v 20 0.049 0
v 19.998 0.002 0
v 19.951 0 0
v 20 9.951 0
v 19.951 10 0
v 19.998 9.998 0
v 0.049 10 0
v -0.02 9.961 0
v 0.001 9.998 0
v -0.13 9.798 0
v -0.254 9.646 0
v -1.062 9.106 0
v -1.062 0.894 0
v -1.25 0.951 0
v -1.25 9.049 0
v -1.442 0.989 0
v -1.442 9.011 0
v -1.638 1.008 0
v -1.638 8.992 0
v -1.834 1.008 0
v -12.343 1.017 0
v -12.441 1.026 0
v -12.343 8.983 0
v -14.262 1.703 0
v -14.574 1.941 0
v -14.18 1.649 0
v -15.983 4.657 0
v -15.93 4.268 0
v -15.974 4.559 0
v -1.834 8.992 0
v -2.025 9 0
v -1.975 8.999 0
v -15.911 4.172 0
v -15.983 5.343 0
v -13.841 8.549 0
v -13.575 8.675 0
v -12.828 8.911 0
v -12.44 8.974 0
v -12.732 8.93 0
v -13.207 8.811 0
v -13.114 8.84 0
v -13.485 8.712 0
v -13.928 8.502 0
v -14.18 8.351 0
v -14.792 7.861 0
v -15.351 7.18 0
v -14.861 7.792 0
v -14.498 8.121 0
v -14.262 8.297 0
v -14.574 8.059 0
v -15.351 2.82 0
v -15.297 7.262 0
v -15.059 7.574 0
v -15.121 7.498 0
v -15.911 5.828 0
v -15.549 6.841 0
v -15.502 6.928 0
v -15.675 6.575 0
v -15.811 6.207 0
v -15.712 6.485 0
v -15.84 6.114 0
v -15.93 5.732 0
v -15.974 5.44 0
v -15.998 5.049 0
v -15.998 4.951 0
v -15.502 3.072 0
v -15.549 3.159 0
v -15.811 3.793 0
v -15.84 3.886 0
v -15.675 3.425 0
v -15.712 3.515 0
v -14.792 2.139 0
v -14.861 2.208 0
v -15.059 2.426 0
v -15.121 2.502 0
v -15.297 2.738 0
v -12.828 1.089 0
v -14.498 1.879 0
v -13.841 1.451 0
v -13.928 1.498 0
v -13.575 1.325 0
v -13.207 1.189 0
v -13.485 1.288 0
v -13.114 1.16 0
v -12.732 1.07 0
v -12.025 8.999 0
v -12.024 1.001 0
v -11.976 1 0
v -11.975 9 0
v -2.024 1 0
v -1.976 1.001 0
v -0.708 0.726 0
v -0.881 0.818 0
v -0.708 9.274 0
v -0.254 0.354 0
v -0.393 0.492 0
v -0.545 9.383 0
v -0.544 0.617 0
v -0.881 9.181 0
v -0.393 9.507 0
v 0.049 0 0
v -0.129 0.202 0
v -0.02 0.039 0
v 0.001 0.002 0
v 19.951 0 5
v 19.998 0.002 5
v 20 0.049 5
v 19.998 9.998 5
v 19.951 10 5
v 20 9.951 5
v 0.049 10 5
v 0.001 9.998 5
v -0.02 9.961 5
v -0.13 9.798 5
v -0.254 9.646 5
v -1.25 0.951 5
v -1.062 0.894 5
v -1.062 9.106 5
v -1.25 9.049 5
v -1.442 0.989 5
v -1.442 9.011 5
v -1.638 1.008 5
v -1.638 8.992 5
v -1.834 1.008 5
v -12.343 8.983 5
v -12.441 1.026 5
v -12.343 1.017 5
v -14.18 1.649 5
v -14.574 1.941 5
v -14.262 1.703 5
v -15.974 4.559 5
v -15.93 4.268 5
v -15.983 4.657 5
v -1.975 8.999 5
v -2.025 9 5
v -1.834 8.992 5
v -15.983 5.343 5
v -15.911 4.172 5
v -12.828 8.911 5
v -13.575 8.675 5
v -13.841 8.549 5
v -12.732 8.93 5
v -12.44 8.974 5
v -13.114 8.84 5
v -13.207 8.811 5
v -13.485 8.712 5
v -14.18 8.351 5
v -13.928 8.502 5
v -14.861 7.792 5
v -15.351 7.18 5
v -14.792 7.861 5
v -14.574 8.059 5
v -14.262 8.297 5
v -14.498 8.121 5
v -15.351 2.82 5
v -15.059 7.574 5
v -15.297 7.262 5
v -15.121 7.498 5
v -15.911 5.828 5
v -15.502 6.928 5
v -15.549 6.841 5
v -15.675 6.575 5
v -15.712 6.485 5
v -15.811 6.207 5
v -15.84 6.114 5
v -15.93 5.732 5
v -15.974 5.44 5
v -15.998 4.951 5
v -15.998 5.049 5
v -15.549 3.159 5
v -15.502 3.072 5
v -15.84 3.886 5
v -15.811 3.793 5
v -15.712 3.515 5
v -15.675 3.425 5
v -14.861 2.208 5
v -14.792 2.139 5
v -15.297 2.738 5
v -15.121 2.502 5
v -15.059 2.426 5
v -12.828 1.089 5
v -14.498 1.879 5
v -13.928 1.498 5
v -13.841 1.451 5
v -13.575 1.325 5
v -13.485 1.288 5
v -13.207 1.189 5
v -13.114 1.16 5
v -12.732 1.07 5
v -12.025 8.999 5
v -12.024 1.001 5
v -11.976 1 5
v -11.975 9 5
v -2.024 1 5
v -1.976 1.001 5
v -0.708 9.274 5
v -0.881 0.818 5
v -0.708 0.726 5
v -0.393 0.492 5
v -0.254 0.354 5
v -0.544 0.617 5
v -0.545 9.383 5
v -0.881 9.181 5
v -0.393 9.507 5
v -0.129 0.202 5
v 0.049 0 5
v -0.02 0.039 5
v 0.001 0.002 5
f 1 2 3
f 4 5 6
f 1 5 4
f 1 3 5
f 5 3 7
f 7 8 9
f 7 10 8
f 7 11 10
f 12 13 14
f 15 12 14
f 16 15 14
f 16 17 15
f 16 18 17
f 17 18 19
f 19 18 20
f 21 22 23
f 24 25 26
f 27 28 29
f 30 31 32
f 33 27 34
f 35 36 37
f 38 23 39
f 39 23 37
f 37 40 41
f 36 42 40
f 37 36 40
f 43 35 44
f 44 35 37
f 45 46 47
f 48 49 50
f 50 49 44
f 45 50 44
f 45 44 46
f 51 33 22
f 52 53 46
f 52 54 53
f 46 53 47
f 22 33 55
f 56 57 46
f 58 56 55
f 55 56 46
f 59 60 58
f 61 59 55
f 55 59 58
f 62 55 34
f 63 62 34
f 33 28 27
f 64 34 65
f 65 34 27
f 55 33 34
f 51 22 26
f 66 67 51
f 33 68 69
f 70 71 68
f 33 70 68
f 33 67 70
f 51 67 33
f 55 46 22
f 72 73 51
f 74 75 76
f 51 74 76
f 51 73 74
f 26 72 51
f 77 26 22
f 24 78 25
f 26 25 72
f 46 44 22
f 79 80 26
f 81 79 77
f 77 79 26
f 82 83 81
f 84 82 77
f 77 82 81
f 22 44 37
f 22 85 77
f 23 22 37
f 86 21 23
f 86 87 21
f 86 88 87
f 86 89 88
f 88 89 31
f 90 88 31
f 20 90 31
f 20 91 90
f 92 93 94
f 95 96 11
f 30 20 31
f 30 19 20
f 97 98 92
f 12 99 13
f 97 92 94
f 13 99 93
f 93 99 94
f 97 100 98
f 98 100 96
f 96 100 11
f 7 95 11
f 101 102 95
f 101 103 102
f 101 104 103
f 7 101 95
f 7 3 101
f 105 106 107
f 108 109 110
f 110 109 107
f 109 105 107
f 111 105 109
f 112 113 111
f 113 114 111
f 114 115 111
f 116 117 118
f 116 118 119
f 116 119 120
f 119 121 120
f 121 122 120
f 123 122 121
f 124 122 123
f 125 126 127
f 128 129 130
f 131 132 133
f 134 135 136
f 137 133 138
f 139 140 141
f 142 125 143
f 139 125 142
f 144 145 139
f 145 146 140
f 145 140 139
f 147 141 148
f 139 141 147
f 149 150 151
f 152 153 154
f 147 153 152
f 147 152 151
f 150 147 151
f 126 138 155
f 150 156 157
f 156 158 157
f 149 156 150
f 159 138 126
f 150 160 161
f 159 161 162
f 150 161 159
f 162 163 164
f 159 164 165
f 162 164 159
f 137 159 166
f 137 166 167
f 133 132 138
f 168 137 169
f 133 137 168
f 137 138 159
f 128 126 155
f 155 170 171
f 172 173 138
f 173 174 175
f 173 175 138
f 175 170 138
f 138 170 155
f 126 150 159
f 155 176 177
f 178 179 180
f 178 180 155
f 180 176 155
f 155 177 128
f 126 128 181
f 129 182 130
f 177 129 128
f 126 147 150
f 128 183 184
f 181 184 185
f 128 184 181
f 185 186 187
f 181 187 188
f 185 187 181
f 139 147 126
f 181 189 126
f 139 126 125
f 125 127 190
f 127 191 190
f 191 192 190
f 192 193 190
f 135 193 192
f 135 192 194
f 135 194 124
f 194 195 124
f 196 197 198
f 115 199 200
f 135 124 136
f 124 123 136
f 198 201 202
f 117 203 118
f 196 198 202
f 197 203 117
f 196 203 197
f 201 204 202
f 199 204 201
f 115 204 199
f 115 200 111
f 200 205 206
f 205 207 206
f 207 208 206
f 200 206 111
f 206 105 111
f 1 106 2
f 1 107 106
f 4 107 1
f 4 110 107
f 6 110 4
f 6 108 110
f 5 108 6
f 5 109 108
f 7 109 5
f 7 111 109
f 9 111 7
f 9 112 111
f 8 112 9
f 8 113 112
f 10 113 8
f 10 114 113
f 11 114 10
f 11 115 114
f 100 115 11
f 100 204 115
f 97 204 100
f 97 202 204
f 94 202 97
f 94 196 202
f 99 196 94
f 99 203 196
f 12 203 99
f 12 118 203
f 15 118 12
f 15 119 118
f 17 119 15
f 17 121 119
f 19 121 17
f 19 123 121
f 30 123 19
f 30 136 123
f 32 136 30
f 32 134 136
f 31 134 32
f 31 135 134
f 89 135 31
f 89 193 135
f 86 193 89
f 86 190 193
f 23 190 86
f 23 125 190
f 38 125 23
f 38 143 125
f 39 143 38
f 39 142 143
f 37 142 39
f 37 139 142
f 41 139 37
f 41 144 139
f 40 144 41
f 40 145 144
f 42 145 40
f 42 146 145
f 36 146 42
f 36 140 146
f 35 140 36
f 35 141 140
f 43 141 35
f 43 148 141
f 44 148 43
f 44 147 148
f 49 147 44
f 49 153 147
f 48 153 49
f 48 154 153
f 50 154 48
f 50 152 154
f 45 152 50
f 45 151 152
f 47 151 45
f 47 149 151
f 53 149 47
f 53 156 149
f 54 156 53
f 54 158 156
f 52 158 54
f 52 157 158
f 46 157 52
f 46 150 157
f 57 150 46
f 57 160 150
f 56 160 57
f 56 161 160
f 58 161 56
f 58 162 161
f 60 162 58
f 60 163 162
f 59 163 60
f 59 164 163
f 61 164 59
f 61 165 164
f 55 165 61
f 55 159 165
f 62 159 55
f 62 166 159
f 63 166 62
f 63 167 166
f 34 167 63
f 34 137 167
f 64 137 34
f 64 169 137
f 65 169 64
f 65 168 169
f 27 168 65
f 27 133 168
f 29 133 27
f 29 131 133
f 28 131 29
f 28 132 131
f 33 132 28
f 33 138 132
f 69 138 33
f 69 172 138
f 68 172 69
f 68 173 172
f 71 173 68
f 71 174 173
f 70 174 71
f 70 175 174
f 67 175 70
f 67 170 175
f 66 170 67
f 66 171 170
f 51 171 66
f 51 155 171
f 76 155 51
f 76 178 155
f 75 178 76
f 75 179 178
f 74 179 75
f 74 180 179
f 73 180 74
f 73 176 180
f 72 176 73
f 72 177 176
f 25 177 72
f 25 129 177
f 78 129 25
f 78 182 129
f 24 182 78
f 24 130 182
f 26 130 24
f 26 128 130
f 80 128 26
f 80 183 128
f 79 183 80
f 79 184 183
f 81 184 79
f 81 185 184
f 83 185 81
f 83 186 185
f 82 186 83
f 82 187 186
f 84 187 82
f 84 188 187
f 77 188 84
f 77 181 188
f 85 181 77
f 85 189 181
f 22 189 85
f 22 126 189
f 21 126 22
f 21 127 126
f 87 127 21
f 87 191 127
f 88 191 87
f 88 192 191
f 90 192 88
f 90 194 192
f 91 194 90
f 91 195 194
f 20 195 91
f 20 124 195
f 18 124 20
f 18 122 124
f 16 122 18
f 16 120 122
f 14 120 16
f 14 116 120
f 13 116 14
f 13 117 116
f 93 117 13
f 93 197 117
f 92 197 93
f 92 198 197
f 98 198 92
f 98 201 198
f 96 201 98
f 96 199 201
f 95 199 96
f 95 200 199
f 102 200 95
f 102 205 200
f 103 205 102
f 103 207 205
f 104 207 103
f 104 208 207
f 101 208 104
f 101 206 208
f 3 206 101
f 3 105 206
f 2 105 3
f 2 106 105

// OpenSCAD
// OpenSCAD's 2D has no up or down. A mirrored hull() was a face turned over (-Z) in build123d; its union with the
// square, face up, stayed two faces side by side, and offset(r = -2) shrank each on its own — the strip along their
// seam lost, as Thingiverse 5353030's mirrored foot (3.1% short)
$fn = 64;
linear_extrude(height = 5) offset(r = -2) offset(r = 2) {
    square([20, 10]);
    mirror([1, 0]) hull() {
        translate([2, 5]) circle(4);
        translate([12, 5]) circle(4);
    }
}
